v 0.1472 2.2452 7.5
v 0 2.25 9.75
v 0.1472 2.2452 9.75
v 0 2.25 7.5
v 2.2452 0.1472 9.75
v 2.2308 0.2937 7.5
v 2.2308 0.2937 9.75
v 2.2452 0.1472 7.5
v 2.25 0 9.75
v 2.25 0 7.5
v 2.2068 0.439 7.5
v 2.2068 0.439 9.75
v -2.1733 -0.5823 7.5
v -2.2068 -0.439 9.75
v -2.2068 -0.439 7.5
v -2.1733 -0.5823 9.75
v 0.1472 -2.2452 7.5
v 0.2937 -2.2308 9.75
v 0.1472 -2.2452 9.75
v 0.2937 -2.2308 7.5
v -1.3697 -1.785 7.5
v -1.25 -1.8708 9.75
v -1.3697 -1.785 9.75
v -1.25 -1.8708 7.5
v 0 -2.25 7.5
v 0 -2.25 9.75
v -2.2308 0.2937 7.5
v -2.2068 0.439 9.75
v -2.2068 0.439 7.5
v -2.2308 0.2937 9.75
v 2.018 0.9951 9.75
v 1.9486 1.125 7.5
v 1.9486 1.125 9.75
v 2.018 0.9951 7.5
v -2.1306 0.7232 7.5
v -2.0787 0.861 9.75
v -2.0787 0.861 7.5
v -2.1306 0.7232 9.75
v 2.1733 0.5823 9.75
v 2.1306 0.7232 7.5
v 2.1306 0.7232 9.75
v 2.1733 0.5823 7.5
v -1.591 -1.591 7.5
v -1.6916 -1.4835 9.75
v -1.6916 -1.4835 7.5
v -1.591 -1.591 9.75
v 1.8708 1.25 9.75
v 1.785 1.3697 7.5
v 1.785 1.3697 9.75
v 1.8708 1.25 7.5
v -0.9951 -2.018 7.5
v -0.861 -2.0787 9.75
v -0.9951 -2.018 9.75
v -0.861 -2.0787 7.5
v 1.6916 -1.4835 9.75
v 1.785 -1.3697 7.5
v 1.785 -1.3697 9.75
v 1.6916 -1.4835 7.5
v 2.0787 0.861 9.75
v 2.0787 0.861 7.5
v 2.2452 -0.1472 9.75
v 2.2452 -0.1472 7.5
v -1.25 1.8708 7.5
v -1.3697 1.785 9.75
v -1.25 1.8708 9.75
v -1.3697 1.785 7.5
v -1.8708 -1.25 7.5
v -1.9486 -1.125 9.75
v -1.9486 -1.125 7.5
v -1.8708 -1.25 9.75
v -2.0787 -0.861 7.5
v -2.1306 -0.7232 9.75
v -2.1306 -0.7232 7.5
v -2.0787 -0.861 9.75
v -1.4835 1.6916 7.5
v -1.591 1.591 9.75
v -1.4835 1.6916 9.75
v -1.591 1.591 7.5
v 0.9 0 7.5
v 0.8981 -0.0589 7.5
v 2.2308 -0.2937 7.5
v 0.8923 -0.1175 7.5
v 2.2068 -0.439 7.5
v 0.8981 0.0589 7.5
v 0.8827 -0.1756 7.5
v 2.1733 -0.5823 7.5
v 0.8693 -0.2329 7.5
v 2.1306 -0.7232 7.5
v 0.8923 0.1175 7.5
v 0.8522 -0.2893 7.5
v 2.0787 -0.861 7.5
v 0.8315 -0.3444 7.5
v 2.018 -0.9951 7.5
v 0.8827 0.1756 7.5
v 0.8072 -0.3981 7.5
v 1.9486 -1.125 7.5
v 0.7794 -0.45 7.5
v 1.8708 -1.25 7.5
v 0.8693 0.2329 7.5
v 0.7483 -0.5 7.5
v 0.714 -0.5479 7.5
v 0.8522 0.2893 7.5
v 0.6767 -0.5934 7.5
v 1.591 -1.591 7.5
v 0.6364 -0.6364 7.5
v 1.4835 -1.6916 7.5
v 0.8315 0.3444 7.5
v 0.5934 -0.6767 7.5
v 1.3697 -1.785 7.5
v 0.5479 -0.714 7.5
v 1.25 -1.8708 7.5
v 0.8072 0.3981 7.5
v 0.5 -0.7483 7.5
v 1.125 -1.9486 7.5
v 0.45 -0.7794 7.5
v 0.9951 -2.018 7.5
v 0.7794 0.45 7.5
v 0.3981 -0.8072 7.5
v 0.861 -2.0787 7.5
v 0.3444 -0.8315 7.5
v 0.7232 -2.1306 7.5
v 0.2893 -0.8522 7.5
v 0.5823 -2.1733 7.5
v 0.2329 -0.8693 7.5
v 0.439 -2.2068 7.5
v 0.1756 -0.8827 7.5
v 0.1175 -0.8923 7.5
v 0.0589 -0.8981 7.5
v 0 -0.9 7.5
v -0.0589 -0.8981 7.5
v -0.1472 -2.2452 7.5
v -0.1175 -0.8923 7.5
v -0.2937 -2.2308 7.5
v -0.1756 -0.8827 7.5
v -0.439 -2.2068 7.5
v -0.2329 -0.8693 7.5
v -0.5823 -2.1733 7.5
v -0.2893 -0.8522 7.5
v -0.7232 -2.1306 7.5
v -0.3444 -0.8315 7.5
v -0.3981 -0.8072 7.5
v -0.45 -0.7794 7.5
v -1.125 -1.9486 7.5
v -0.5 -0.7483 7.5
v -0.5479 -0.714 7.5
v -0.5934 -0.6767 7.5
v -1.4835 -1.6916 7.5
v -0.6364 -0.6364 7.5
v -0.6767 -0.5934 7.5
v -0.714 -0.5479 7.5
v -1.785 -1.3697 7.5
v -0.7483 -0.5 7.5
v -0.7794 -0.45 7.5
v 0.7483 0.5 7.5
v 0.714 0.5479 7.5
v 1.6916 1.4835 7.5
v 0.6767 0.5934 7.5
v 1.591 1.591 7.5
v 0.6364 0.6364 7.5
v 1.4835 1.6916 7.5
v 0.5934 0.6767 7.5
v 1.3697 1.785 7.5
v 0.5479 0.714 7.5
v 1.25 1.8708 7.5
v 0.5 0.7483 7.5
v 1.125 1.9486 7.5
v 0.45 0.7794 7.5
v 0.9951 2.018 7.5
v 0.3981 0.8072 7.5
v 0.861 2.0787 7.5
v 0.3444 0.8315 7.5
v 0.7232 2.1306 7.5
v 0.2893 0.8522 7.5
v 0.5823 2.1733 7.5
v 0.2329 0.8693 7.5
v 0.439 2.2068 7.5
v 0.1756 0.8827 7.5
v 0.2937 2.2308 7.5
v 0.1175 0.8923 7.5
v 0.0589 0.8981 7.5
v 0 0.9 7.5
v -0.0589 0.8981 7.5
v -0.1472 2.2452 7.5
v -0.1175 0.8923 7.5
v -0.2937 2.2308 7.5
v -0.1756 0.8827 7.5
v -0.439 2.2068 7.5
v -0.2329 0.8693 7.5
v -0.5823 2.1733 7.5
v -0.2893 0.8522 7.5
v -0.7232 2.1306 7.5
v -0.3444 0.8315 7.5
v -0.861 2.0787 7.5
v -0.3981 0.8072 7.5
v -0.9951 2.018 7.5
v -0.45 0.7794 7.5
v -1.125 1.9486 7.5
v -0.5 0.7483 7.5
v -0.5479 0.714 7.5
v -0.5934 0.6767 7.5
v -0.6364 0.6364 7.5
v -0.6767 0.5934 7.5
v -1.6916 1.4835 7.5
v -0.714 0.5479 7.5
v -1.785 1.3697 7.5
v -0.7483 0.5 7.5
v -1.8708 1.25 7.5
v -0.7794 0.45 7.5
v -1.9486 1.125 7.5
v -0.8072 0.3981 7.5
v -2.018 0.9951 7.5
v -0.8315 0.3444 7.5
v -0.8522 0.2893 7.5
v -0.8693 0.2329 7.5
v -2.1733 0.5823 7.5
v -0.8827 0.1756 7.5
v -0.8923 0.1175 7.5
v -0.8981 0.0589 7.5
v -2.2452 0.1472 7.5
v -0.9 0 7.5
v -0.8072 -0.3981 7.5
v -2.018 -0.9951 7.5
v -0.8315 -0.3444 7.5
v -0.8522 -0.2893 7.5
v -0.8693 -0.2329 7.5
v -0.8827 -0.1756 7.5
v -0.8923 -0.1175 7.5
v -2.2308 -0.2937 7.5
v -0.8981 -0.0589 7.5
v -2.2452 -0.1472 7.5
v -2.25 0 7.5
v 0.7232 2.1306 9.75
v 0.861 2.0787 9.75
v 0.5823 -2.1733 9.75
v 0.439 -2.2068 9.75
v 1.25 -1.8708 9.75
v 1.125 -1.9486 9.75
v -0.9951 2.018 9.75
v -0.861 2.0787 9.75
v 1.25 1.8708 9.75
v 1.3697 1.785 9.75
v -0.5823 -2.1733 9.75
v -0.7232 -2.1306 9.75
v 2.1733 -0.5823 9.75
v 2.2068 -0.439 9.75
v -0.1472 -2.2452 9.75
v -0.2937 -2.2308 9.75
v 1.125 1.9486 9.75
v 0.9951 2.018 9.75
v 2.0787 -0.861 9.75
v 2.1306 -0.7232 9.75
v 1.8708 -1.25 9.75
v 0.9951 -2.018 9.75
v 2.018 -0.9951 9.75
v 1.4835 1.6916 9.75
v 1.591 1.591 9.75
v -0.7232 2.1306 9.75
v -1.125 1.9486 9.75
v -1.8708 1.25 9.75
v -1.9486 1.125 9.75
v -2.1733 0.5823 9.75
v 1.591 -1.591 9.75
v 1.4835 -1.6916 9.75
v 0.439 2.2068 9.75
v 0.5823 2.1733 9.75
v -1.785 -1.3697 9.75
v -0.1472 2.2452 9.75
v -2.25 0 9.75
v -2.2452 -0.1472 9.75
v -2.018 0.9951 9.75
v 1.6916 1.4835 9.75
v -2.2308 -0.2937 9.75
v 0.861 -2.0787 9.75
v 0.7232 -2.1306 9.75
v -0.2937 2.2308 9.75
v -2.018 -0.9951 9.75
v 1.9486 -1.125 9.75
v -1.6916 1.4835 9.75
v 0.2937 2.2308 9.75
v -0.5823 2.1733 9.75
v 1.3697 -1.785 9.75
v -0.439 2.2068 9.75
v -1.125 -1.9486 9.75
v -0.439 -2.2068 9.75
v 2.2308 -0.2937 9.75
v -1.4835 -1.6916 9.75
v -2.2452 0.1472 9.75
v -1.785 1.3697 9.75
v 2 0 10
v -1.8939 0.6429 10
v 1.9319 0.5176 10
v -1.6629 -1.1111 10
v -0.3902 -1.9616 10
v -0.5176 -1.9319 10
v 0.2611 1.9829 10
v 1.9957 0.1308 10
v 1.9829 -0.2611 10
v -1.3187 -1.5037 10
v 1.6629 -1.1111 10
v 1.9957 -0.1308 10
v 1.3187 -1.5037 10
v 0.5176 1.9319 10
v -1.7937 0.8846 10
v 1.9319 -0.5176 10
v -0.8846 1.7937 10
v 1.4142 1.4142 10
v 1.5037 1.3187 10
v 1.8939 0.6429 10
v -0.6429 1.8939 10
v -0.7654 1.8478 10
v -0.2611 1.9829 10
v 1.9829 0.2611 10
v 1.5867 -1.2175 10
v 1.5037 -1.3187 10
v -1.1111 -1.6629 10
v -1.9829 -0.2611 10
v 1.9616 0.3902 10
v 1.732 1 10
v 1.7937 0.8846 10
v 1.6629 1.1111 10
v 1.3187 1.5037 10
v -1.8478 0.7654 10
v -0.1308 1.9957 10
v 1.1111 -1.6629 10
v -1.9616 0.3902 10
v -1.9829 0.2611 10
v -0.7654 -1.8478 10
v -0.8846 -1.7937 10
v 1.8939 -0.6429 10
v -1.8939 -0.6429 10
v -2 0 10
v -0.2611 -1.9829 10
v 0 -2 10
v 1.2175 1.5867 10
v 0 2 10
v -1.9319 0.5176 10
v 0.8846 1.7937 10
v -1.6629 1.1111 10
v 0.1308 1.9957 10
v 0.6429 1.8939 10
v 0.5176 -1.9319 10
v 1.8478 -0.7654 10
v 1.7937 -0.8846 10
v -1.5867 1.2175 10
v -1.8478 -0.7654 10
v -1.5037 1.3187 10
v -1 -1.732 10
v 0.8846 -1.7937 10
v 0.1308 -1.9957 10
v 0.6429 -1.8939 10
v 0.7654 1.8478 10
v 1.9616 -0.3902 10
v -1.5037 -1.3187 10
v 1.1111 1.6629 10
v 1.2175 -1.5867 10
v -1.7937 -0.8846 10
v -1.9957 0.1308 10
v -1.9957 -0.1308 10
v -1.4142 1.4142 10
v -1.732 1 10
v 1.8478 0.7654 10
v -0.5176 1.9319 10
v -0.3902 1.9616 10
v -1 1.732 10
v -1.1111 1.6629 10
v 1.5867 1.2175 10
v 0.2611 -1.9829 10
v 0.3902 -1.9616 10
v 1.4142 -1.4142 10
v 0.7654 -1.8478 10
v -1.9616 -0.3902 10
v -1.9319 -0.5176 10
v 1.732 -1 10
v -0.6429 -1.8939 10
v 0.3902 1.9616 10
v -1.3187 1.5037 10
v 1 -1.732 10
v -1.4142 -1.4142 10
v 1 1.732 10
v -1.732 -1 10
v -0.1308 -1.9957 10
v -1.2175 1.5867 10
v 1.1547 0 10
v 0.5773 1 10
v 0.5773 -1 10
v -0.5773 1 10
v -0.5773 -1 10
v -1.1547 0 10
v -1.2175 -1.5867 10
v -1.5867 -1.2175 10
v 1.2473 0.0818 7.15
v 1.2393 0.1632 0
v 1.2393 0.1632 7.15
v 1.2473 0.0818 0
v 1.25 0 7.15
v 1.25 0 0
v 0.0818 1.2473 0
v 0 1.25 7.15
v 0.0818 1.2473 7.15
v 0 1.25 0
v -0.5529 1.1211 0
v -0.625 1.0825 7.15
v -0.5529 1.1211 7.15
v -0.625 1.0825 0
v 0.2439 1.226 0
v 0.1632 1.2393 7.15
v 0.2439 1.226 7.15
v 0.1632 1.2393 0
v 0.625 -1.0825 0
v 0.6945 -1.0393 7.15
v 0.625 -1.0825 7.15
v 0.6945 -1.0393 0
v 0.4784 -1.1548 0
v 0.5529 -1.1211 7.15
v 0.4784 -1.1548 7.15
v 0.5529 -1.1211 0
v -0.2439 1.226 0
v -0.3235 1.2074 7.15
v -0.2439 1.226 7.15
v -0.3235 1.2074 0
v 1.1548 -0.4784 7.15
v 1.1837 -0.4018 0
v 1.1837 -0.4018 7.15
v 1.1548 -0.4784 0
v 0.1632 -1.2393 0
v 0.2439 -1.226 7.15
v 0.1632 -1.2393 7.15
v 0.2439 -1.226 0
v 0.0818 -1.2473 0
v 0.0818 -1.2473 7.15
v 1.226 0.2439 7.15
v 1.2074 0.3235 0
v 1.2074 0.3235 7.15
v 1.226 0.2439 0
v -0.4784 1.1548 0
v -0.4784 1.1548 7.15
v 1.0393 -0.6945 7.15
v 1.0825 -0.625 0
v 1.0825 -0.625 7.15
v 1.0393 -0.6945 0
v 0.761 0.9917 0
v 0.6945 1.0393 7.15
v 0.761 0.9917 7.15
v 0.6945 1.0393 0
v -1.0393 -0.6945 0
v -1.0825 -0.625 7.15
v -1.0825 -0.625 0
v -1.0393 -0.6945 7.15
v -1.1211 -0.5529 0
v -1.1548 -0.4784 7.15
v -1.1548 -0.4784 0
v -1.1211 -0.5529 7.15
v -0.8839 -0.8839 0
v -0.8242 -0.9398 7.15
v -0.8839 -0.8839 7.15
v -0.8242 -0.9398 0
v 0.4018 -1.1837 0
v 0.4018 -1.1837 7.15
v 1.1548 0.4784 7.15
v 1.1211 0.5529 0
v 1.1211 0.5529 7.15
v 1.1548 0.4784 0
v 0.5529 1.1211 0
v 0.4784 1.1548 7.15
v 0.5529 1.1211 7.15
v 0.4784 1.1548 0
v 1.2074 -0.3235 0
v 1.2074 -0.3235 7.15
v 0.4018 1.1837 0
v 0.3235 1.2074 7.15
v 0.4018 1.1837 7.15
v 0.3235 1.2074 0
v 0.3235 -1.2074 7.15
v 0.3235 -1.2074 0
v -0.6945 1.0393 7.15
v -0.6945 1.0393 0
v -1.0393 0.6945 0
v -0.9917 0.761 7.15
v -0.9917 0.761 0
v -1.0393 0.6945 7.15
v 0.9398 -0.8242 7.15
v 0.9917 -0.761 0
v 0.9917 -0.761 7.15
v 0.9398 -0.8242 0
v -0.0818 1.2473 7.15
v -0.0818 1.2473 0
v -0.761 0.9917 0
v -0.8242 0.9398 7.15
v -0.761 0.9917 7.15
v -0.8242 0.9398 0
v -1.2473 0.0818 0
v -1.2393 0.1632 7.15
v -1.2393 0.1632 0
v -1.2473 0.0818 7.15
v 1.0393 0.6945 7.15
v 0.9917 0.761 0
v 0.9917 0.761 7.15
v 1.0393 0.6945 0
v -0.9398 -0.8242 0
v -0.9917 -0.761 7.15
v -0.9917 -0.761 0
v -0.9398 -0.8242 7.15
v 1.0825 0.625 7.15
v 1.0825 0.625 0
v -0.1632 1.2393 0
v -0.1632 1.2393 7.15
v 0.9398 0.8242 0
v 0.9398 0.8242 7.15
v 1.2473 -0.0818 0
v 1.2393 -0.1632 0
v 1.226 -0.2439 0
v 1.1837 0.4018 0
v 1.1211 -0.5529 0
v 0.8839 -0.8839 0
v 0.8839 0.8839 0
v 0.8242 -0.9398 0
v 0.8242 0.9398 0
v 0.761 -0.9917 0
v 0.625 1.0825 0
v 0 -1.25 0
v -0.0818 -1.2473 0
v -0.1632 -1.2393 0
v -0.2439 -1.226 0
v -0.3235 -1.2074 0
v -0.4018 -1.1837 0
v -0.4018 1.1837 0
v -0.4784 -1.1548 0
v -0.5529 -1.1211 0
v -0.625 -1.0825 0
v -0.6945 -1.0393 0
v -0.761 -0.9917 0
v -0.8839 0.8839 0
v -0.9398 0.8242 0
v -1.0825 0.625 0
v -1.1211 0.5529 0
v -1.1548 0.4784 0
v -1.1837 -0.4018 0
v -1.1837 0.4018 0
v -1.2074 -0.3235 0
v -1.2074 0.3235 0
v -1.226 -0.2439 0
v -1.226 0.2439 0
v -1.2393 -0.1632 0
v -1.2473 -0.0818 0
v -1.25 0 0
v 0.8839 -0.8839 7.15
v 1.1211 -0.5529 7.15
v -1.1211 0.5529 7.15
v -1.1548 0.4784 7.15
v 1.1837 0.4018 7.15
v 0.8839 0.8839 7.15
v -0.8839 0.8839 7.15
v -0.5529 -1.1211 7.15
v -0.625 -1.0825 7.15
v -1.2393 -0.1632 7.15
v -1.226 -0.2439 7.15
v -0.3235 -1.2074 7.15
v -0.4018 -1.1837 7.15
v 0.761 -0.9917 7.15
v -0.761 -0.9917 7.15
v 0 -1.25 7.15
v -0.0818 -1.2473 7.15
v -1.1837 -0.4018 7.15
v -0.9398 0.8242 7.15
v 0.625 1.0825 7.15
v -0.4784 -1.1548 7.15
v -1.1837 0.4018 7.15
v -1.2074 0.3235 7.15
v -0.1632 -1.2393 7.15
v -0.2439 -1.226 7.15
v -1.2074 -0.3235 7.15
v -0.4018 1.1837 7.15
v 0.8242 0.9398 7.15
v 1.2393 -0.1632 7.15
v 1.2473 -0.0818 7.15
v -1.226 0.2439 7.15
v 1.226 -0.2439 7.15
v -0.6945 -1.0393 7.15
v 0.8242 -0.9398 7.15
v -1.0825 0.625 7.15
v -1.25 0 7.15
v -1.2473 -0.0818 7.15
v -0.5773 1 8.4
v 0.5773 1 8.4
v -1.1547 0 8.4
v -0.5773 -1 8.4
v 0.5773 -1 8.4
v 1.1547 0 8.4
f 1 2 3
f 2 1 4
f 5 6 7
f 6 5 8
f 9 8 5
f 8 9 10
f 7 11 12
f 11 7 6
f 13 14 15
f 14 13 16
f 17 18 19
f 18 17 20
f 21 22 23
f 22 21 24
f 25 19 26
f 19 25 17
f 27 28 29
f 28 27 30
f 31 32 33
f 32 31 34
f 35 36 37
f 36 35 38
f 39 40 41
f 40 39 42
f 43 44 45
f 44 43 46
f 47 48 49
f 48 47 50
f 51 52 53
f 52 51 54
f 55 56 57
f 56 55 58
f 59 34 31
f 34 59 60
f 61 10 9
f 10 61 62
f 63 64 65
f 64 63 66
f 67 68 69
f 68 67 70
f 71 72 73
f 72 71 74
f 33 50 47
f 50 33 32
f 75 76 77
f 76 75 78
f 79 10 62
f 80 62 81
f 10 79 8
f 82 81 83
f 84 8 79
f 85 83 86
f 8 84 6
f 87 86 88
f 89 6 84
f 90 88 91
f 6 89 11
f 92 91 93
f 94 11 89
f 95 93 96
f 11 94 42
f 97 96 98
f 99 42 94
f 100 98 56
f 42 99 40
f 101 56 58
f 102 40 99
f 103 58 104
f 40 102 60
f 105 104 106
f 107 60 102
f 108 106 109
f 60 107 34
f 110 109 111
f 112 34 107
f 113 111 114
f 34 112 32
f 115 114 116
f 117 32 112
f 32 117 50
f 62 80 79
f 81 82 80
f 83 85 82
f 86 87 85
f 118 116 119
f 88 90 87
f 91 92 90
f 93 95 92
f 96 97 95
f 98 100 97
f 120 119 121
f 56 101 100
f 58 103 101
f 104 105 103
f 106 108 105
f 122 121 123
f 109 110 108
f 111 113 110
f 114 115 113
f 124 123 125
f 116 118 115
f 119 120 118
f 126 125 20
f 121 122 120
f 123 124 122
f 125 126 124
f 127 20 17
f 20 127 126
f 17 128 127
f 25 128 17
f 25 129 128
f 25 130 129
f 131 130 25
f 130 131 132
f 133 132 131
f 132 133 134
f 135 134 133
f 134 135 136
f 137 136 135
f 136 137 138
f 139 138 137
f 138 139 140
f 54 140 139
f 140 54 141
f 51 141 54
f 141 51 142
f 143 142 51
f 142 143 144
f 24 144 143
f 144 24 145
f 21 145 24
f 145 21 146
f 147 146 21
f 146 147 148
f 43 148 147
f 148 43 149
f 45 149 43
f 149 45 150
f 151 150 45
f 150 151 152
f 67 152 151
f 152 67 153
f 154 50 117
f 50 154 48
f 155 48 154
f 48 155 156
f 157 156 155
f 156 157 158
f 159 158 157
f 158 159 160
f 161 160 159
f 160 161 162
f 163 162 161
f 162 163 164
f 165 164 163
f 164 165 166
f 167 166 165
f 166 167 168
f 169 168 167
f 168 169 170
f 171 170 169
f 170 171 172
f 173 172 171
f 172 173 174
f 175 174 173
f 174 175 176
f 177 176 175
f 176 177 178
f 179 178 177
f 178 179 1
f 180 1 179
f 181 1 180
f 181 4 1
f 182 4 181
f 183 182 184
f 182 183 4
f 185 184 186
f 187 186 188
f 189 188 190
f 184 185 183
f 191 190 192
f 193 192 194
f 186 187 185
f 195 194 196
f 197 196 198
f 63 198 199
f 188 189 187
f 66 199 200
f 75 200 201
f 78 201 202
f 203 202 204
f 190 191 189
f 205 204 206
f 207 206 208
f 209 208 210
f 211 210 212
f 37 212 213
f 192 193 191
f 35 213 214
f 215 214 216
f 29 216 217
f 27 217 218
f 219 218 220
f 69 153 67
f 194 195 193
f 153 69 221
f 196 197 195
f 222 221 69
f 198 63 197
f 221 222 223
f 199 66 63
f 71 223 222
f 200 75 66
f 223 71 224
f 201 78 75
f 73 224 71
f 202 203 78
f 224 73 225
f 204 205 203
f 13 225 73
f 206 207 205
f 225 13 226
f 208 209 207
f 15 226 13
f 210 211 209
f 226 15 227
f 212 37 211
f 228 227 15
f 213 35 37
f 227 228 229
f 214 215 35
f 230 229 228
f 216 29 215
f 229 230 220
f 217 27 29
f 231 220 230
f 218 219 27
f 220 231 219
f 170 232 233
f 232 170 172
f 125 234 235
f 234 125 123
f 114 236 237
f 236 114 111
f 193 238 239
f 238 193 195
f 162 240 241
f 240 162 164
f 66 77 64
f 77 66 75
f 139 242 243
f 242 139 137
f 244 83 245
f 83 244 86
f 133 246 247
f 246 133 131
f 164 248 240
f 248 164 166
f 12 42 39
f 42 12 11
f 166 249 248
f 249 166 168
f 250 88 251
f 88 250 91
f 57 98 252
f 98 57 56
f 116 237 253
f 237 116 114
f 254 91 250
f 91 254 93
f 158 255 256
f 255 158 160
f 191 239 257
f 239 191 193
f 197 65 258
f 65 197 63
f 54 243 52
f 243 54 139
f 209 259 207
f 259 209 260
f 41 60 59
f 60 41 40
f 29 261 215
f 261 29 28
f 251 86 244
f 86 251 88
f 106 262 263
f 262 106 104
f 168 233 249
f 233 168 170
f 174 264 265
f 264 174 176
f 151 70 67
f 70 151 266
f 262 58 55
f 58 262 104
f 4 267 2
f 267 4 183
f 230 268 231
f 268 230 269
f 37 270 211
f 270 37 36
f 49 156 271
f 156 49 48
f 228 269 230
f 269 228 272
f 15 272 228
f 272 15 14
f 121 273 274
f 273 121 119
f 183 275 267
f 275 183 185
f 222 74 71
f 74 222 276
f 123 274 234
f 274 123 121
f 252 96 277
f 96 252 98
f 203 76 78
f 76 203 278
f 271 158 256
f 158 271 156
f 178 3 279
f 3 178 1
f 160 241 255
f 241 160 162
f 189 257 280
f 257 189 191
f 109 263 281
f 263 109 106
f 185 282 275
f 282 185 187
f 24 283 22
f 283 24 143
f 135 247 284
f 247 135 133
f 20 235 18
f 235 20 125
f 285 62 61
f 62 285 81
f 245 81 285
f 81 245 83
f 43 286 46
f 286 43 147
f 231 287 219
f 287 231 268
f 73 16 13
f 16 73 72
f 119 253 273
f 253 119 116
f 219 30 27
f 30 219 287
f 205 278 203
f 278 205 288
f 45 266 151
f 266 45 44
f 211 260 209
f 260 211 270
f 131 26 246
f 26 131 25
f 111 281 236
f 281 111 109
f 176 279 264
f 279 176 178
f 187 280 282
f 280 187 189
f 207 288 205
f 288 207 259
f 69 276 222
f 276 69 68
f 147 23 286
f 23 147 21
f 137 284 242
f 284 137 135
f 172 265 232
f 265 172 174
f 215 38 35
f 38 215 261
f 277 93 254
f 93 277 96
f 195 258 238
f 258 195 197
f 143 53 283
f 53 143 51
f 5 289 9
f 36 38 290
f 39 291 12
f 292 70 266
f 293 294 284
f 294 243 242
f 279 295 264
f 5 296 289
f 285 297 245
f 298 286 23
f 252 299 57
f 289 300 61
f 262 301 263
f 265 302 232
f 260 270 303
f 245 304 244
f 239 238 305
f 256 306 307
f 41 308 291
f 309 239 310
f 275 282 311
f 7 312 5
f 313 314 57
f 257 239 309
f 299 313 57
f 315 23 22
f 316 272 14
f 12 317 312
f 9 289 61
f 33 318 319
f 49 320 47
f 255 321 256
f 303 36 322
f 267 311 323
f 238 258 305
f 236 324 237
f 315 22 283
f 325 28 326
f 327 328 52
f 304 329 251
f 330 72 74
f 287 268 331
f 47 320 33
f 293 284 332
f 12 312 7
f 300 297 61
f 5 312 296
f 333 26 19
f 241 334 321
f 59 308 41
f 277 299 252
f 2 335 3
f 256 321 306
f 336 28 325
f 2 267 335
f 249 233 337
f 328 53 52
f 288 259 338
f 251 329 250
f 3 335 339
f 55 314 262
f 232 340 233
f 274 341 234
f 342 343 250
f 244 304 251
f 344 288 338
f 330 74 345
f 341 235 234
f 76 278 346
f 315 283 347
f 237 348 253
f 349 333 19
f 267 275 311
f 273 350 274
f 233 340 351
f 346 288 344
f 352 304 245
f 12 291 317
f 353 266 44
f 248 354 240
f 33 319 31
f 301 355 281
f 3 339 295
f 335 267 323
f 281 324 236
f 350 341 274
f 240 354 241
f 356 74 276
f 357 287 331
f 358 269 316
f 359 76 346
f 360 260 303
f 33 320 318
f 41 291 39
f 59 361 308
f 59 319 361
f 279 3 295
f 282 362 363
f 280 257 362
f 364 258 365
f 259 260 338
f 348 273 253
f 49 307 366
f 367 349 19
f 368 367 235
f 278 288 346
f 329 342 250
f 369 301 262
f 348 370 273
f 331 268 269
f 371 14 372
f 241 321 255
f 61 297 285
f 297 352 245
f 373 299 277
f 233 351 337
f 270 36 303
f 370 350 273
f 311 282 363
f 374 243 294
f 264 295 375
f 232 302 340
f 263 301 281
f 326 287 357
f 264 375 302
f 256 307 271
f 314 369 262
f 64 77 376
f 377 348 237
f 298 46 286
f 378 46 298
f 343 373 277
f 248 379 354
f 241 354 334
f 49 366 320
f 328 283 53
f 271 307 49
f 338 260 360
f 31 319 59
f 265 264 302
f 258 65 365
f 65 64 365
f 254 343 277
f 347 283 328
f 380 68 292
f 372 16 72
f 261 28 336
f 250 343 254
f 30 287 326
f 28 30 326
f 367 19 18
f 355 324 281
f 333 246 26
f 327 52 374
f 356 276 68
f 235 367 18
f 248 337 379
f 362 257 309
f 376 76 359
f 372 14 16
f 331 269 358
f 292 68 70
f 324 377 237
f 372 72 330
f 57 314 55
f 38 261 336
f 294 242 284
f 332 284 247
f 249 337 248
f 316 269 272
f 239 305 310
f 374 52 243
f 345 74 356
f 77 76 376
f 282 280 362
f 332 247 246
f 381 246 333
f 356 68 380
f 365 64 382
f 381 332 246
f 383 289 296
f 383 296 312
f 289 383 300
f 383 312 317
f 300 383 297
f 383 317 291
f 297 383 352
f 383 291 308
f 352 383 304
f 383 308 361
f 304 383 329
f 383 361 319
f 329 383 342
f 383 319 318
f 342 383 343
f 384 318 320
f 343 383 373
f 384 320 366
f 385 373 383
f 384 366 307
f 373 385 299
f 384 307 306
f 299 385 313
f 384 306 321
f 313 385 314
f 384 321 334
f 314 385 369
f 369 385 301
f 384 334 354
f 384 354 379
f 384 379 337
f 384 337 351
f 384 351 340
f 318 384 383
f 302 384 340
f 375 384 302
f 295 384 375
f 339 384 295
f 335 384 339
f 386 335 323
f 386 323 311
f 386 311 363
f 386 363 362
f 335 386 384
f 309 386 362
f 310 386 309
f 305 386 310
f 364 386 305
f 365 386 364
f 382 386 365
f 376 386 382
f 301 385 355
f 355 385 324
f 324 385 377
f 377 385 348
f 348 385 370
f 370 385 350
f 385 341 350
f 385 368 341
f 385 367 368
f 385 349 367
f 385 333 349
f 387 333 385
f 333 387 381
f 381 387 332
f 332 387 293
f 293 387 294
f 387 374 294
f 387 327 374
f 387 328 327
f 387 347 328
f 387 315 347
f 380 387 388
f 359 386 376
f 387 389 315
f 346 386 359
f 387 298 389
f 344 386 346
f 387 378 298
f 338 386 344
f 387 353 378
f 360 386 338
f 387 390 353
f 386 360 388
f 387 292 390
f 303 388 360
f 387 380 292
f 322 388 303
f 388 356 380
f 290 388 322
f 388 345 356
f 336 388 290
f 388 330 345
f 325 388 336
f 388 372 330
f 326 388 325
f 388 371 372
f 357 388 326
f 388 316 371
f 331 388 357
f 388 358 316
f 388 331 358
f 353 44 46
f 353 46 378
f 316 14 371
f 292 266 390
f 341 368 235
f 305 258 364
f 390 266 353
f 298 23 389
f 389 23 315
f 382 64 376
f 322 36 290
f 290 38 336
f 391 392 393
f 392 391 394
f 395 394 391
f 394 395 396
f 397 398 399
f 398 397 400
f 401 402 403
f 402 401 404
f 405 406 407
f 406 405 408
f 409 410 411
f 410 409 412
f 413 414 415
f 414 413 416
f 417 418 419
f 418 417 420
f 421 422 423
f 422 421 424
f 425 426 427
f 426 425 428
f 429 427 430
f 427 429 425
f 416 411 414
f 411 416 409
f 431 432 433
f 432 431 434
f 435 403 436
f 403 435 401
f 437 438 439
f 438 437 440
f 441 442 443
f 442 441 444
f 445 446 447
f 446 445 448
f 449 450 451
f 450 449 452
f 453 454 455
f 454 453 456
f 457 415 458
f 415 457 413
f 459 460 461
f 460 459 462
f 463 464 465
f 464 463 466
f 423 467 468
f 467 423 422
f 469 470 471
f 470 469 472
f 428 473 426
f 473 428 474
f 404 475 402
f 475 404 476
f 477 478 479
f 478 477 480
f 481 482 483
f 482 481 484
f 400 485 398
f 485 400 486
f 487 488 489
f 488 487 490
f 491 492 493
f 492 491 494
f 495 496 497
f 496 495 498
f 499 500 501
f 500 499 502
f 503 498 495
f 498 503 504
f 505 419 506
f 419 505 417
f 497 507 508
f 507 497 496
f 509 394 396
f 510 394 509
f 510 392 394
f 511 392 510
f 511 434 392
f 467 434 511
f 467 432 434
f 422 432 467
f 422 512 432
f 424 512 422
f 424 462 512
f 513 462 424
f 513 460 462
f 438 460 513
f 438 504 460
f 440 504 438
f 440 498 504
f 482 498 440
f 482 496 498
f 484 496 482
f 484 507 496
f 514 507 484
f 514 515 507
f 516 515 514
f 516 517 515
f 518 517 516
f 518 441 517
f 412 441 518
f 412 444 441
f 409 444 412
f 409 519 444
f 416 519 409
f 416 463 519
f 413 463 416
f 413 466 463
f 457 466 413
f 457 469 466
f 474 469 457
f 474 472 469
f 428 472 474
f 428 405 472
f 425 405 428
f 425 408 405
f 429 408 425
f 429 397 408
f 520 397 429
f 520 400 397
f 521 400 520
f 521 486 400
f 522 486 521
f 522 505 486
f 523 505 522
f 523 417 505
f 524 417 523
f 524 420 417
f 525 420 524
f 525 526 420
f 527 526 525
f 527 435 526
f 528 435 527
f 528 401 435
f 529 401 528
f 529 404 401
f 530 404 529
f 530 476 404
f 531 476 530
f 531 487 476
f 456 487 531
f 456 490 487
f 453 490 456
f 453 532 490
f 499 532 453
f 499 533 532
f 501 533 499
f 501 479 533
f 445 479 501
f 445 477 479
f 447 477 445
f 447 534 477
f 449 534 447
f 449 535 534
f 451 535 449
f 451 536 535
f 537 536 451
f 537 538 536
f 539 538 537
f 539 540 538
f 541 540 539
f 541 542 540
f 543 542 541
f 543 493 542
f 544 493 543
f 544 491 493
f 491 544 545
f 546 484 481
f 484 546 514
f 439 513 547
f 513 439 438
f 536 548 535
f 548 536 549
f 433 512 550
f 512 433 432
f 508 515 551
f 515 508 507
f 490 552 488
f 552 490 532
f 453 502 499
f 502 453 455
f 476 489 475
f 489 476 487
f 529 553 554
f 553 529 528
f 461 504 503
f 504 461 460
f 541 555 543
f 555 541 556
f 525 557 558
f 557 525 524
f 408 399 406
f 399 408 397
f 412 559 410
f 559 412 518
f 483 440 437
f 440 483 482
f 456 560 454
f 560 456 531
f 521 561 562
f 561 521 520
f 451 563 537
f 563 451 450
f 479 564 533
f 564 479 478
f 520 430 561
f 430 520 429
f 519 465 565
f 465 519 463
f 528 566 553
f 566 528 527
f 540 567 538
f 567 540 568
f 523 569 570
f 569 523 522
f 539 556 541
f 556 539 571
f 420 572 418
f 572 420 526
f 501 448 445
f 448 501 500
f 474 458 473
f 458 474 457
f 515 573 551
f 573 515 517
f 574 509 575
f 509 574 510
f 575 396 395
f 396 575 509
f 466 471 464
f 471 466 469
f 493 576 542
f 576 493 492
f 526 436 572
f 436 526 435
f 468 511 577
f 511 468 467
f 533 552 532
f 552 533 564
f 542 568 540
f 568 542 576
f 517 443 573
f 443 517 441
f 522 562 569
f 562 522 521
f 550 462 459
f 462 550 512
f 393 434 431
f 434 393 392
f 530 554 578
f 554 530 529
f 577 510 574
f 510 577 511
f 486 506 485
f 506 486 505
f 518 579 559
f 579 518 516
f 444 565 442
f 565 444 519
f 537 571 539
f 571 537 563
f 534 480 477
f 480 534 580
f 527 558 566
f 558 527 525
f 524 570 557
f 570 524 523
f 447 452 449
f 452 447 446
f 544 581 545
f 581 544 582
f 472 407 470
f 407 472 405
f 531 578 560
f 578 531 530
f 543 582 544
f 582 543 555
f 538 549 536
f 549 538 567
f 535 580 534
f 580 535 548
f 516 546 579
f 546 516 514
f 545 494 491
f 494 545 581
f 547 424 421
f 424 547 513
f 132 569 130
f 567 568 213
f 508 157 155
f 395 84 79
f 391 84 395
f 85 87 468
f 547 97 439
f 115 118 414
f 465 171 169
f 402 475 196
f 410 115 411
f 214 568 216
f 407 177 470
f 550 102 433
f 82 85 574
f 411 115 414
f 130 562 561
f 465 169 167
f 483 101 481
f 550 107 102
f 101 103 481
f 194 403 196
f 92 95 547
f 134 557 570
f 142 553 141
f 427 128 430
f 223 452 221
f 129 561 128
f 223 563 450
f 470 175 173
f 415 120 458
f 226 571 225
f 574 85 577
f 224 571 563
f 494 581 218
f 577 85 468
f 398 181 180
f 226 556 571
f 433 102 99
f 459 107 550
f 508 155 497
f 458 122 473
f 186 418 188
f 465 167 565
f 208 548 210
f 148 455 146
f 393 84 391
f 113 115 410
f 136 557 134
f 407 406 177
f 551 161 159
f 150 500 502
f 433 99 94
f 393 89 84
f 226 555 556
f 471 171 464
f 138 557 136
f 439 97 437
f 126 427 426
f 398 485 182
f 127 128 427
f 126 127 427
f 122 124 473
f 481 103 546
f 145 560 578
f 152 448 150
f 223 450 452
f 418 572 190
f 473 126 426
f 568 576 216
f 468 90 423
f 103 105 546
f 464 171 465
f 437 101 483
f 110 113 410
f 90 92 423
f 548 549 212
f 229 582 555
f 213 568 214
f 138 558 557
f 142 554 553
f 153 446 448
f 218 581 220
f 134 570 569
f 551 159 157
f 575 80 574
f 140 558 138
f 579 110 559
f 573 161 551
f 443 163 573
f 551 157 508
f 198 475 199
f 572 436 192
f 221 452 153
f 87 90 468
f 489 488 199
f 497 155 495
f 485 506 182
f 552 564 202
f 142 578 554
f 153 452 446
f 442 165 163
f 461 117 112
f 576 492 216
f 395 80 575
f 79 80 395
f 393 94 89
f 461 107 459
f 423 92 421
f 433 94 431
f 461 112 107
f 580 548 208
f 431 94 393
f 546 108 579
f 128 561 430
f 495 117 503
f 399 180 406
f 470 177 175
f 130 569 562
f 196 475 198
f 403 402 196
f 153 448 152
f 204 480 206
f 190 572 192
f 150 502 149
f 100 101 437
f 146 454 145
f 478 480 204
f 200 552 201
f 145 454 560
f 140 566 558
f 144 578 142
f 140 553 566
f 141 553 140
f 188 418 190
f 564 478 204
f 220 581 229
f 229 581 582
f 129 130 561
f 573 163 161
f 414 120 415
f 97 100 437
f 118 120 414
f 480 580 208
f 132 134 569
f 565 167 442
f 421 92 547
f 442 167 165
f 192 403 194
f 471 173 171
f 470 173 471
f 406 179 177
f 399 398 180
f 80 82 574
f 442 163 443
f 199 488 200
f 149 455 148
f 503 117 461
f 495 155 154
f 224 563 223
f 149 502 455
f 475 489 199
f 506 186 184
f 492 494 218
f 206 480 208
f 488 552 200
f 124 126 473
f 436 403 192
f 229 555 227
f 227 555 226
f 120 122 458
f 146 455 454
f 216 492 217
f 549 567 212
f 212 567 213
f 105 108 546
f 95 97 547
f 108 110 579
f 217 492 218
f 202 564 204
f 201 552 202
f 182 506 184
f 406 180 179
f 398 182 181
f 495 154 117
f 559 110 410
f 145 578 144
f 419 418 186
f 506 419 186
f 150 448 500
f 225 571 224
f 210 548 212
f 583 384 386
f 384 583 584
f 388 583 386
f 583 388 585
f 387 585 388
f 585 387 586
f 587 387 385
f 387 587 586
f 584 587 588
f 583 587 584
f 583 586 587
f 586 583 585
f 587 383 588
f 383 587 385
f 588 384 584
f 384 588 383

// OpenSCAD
// Socket head cap screw (simplified, no threads)
// Dimensions requested:
// shank dia = 2.5mm, head dia = 4.5mm, head height = 2.5mm, overall length = 10mm

$fn = 96;

// --- Parameters (mm) ---
d_shank   = 2.5;
d_head    = 4.5;
h_head    = 2.5;
L_overall = 10;

socket_hex_af = 2.0;   // internal hex across flats (approx for this size)
socket_depth  = 1.6;   // recess depth

// Small edge treatments
top_chamfer = 0.25;    // head top chamfer height
tip_chamfer = 0.35;    // shank tip chamfer height
eps         = 0.02;    // overlap/robustness

// Derived
L_shank = L_overall - h_head;

// --- Helpers ---
function hex_R_from_AF(af) = af / sqrt(3); // circumradius for regular hex given across-flats

module hex_prism(af, h, center=false) {
    R = hex_R_from_AF(af);
    linear_extrude(height=h, center=center)
        polygon([ for (i=[0:5]) [ R*cos(60*i), R*sin(60*i) ] ]);
}

// --- Main model ---
module socket_head_cap_screw() {
    difference() {
        union() {
            // Head: cylinder with slight top chamfer (frustum)
            translate([0,0,L_shank])
            union() {
                // main head body (minus chamfer height)
                cylinder(h=h_head - top_chamfer, r=d_head/2);

                // top chamfer
                translate([0,0,h_head - top_chamfer])
                    cylinder(h=top_chamfer, r1=d_head/2, r2=max(d_head/2 - top_chamfer, 0.01));
            }

            // Shank: cylinder with slight tip chamfer
            union() {
                // main shank
                cylinder(h=max(L_shank - tip_chamfer, 0), r=d_shank/2);

                // tip chamfer (at bottom end)
                if (tip_chamfer > 0)
                    translate([0,0,max(L_shank - tip_chamfer, 0)])
                        cylinder(h=tip_chamfer, r1=d_shank/2, r2=max(d_shank/2 - tip_chamfer, 0.01));
            }
        }

        // Internal hex socket recess (subtracted from head top)
        // Place so its top is flush with head top surface.
        translate([0,0,L_shank + h_head - socket_depth])
            hex_prism(socket_hex_af, socket_depth + eps, center=false);
    }
}

socket_head_cap_screw();
